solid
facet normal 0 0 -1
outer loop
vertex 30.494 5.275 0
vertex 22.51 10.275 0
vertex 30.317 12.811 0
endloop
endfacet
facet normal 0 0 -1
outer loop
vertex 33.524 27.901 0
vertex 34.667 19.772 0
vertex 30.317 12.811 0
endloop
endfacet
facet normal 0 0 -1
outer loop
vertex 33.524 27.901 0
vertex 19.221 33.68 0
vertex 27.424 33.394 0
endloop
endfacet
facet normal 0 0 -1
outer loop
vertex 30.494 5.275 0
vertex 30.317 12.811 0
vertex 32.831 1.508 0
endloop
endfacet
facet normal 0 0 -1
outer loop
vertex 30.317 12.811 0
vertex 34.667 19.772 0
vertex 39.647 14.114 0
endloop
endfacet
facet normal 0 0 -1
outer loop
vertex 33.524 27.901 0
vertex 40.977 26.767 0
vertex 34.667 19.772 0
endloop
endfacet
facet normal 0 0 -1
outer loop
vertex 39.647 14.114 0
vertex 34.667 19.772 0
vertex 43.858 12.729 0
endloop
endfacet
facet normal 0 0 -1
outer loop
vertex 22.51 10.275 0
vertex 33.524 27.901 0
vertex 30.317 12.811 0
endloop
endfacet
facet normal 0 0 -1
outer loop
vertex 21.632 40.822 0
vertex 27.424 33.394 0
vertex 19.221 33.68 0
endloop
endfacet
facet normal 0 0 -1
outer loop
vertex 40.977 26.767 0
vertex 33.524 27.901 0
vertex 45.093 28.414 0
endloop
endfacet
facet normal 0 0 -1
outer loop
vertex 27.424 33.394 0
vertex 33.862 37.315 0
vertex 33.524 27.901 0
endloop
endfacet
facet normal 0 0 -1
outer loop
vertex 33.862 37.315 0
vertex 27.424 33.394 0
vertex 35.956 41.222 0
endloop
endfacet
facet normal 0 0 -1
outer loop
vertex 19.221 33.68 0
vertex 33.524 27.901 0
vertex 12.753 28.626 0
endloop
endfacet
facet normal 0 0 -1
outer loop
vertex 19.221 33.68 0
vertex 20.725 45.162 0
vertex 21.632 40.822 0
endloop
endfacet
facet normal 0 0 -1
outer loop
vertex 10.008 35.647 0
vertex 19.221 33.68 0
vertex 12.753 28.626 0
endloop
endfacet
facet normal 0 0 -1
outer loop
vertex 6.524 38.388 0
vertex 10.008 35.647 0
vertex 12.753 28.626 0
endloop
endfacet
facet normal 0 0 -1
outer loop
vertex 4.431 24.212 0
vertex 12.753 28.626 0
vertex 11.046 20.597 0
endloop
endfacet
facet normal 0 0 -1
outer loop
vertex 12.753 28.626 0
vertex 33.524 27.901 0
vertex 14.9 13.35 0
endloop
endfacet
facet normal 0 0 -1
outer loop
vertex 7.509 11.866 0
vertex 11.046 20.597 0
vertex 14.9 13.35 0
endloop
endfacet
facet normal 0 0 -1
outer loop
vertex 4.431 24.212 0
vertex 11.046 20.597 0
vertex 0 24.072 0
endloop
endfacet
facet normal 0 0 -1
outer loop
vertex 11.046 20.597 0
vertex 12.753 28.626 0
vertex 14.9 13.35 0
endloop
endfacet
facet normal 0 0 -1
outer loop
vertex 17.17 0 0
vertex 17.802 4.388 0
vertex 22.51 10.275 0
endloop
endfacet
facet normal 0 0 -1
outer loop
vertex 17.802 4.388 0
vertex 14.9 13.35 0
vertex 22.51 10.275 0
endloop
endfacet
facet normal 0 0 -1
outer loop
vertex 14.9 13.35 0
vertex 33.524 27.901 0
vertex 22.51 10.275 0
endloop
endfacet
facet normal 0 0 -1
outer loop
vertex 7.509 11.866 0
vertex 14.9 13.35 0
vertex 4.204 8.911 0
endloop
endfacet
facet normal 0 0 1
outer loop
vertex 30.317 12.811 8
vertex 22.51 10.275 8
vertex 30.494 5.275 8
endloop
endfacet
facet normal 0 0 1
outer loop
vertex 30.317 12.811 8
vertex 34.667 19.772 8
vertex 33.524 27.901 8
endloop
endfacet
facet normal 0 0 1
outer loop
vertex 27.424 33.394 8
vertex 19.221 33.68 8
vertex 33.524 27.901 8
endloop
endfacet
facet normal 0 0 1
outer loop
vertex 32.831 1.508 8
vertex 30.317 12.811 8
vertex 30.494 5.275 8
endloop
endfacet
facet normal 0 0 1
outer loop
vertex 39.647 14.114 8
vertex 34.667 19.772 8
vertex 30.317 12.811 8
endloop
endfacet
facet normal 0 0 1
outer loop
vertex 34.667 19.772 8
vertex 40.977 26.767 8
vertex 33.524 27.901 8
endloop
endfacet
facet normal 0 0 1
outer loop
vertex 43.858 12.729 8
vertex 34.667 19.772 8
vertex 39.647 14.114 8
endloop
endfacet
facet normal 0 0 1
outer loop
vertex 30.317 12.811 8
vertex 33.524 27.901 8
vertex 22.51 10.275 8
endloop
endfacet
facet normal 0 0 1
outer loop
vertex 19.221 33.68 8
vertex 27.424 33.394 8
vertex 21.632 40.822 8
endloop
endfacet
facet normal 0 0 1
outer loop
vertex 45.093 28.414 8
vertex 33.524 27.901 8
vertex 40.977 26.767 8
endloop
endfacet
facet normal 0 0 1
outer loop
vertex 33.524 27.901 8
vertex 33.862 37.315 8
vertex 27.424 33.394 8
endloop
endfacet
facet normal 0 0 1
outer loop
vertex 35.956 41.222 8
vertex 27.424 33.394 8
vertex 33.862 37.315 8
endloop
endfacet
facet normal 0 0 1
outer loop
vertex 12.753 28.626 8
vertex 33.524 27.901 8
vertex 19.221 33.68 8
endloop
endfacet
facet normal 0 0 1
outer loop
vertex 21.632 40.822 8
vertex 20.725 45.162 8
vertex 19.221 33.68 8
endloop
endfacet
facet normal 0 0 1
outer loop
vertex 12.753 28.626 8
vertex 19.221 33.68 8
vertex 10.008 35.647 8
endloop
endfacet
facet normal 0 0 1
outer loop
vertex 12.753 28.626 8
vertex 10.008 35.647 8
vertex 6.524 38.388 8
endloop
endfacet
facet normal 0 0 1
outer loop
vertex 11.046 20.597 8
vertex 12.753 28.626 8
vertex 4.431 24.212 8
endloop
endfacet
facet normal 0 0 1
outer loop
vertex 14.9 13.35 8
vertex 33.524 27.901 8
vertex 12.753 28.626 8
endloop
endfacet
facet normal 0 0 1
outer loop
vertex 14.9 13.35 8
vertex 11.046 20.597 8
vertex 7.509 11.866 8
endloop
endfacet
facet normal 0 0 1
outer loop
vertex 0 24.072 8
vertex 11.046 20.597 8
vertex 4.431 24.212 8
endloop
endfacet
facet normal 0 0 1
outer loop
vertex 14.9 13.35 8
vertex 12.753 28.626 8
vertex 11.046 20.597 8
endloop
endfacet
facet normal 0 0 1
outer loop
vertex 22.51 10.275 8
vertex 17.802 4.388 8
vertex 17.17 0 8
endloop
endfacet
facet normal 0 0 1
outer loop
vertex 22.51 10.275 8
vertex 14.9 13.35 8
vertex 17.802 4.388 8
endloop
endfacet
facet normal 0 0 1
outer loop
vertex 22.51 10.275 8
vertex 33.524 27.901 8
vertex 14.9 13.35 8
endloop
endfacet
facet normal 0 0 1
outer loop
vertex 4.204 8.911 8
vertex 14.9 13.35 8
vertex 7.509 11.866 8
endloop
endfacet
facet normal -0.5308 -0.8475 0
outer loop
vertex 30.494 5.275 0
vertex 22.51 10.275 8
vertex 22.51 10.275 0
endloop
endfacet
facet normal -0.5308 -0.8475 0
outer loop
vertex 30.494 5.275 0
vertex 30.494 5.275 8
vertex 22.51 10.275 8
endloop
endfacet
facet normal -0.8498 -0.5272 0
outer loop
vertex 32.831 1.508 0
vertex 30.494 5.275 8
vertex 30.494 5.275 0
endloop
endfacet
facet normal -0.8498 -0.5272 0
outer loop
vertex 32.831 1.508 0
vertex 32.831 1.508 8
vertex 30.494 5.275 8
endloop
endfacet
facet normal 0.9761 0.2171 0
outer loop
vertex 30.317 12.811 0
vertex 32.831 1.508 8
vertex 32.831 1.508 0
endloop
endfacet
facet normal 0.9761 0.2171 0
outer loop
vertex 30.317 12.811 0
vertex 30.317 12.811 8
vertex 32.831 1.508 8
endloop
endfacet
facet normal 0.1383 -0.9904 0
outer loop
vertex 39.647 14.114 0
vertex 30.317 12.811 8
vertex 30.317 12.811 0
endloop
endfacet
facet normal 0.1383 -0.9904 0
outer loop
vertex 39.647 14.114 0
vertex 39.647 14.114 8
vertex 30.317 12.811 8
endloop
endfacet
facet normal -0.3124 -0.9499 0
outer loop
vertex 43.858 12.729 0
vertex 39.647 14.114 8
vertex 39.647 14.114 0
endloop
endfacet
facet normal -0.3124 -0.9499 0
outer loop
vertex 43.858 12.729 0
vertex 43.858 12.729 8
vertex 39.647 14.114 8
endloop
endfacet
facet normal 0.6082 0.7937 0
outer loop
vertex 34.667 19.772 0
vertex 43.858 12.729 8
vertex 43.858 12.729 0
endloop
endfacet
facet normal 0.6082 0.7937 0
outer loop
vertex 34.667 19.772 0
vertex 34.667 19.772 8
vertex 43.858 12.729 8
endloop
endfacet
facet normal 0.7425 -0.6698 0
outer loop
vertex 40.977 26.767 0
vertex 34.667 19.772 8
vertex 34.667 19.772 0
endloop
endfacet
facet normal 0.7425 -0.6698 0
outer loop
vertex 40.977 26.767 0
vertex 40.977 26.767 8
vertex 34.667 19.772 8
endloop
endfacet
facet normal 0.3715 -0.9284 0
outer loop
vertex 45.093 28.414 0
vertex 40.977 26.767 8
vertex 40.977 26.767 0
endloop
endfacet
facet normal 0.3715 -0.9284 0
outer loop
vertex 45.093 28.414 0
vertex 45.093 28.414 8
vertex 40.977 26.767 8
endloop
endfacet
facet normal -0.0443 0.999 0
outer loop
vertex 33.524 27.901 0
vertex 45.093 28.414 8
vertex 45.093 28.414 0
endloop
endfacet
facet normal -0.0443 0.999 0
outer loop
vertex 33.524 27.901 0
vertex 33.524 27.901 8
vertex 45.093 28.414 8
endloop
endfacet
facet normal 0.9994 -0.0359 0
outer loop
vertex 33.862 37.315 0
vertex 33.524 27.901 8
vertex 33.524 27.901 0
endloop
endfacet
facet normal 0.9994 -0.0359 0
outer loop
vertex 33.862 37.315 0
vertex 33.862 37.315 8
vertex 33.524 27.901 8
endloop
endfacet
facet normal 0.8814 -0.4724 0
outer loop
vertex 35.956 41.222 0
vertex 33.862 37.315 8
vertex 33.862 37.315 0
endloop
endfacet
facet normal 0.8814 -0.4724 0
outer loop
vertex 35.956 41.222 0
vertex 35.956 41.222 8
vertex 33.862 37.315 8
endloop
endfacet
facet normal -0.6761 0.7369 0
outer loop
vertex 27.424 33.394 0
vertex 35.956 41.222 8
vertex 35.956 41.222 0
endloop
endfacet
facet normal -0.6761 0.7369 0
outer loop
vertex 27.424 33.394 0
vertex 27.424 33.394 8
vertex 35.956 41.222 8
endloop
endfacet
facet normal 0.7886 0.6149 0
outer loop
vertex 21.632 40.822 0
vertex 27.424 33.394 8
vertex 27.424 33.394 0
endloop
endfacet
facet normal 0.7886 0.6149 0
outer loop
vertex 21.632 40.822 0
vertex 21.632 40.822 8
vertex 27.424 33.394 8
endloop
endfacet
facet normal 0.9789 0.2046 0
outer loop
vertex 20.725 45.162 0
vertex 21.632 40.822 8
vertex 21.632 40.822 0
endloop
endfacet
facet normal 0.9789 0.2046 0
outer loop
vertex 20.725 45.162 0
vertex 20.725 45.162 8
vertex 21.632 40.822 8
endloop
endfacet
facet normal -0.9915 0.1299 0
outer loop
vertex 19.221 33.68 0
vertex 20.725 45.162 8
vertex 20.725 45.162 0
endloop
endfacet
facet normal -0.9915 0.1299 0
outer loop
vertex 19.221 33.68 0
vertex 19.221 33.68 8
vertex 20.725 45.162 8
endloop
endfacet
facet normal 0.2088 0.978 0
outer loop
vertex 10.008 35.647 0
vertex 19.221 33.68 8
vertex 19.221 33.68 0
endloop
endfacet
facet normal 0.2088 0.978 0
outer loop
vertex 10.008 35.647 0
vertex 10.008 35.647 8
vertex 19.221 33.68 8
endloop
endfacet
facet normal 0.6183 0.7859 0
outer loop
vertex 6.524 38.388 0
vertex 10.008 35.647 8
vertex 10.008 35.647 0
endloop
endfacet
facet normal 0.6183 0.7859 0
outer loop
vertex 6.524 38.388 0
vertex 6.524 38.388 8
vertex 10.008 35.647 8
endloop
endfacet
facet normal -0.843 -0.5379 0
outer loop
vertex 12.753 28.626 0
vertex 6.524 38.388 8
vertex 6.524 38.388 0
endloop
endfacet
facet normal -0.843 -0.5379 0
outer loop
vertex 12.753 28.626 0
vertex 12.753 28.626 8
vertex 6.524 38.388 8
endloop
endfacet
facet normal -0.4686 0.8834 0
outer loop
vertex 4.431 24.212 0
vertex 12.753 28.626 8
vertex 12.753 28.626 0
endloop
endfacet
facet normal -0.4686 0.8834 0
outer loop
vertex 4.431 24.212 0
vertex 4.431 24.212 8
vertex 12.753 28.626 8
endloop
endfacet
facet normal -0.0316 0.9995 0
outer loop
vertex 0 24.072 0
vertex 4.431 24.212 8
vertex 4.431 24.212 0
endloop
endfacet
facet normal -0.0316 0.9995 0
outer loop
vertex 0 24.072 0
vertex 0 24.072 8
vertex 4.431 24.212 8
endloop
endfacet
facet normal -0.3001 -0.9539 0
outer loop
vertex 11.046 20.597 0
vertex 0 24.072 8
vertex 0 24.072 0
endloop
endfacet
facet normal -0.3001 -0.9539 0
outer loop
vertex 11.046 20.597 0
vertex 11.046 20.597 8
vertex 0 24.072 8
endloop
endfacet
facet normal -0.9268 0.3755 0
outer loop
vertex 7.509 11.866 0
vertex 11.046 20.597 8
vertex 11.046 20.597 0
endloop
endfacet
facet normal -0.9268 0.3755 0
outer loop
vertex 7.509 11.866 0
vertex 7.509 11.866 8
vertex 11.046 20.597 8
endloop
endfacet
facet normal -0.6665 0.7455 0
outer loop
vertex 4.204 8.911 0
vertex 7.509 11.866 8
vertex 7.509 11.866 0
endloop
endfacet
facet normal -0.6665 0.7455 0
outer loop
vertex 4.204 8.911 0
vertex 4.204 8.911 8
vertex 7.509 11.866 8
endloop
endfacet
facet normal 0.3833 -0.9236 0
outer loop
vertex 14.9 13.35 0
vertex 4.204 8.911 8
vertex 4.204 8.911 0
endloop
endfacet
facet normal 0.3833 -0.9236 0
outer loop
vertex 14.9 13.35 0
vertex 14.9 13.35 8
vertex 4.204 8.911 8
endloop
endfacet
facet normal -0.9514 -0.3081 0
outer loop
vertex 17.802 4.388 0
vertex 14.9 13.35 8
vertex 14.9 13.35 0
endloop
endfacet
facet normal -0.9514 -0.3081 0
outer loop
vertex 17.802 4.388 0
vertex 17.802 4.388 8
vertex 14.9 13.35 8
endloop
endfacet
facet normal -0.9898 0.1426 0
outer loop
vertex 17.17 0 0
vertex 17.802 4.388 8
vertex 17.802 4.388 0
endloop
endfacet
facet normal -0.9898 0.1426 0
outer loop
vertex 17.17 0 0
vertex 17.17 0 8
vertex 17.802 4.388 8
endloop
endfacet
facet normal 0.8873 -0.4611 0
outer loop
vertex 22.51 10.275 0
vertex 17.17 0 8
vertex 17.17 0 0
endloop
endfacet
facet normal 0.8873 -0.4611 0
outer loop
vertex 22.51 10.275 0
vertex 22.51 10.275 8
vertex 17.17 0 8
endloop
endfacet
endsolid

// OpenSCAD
$fn = 32;

// ----------------------------------------------------------------------
// Fan rotor section: 9 blades, 12 mm hub radius, 11 mm blades
// ----------------------------------------------------------------------

// --- parameters (mm) ---
profile_height = 8;       // extrusion height
profile_points = 27;      // points of the closed outline

profile = [[34.667, 19.772], [40.977, 26.767], [45.093, 28.414], [33.524, 27.901], [33.862, 37.315], [35.956, 41.222], [27.424, 33.394], [21.632, 40.822], [20.725, 45.162], [19.221, 33.68], [10.008, 35.647], [6.524, 38.388], [12.753, 28.626], [4.431, 24.212], [0, 24.072], [11.046, 20.597], [7.509, 11.866], [4.204, 8.911], [14.9, 13.35], [17.802, 4.388], [17.17, 0], [22.51, 10.275], [30.494, 5.275], [32.831, 1.508], [30.317, 12.811], [39.647, 14.114], [43.858, 12.729]];  // single closed polygon, 27 points, counter clockwise

// --- the one profile operation ---
linear_extrude(height = profile_height) polygon(points = profile);
